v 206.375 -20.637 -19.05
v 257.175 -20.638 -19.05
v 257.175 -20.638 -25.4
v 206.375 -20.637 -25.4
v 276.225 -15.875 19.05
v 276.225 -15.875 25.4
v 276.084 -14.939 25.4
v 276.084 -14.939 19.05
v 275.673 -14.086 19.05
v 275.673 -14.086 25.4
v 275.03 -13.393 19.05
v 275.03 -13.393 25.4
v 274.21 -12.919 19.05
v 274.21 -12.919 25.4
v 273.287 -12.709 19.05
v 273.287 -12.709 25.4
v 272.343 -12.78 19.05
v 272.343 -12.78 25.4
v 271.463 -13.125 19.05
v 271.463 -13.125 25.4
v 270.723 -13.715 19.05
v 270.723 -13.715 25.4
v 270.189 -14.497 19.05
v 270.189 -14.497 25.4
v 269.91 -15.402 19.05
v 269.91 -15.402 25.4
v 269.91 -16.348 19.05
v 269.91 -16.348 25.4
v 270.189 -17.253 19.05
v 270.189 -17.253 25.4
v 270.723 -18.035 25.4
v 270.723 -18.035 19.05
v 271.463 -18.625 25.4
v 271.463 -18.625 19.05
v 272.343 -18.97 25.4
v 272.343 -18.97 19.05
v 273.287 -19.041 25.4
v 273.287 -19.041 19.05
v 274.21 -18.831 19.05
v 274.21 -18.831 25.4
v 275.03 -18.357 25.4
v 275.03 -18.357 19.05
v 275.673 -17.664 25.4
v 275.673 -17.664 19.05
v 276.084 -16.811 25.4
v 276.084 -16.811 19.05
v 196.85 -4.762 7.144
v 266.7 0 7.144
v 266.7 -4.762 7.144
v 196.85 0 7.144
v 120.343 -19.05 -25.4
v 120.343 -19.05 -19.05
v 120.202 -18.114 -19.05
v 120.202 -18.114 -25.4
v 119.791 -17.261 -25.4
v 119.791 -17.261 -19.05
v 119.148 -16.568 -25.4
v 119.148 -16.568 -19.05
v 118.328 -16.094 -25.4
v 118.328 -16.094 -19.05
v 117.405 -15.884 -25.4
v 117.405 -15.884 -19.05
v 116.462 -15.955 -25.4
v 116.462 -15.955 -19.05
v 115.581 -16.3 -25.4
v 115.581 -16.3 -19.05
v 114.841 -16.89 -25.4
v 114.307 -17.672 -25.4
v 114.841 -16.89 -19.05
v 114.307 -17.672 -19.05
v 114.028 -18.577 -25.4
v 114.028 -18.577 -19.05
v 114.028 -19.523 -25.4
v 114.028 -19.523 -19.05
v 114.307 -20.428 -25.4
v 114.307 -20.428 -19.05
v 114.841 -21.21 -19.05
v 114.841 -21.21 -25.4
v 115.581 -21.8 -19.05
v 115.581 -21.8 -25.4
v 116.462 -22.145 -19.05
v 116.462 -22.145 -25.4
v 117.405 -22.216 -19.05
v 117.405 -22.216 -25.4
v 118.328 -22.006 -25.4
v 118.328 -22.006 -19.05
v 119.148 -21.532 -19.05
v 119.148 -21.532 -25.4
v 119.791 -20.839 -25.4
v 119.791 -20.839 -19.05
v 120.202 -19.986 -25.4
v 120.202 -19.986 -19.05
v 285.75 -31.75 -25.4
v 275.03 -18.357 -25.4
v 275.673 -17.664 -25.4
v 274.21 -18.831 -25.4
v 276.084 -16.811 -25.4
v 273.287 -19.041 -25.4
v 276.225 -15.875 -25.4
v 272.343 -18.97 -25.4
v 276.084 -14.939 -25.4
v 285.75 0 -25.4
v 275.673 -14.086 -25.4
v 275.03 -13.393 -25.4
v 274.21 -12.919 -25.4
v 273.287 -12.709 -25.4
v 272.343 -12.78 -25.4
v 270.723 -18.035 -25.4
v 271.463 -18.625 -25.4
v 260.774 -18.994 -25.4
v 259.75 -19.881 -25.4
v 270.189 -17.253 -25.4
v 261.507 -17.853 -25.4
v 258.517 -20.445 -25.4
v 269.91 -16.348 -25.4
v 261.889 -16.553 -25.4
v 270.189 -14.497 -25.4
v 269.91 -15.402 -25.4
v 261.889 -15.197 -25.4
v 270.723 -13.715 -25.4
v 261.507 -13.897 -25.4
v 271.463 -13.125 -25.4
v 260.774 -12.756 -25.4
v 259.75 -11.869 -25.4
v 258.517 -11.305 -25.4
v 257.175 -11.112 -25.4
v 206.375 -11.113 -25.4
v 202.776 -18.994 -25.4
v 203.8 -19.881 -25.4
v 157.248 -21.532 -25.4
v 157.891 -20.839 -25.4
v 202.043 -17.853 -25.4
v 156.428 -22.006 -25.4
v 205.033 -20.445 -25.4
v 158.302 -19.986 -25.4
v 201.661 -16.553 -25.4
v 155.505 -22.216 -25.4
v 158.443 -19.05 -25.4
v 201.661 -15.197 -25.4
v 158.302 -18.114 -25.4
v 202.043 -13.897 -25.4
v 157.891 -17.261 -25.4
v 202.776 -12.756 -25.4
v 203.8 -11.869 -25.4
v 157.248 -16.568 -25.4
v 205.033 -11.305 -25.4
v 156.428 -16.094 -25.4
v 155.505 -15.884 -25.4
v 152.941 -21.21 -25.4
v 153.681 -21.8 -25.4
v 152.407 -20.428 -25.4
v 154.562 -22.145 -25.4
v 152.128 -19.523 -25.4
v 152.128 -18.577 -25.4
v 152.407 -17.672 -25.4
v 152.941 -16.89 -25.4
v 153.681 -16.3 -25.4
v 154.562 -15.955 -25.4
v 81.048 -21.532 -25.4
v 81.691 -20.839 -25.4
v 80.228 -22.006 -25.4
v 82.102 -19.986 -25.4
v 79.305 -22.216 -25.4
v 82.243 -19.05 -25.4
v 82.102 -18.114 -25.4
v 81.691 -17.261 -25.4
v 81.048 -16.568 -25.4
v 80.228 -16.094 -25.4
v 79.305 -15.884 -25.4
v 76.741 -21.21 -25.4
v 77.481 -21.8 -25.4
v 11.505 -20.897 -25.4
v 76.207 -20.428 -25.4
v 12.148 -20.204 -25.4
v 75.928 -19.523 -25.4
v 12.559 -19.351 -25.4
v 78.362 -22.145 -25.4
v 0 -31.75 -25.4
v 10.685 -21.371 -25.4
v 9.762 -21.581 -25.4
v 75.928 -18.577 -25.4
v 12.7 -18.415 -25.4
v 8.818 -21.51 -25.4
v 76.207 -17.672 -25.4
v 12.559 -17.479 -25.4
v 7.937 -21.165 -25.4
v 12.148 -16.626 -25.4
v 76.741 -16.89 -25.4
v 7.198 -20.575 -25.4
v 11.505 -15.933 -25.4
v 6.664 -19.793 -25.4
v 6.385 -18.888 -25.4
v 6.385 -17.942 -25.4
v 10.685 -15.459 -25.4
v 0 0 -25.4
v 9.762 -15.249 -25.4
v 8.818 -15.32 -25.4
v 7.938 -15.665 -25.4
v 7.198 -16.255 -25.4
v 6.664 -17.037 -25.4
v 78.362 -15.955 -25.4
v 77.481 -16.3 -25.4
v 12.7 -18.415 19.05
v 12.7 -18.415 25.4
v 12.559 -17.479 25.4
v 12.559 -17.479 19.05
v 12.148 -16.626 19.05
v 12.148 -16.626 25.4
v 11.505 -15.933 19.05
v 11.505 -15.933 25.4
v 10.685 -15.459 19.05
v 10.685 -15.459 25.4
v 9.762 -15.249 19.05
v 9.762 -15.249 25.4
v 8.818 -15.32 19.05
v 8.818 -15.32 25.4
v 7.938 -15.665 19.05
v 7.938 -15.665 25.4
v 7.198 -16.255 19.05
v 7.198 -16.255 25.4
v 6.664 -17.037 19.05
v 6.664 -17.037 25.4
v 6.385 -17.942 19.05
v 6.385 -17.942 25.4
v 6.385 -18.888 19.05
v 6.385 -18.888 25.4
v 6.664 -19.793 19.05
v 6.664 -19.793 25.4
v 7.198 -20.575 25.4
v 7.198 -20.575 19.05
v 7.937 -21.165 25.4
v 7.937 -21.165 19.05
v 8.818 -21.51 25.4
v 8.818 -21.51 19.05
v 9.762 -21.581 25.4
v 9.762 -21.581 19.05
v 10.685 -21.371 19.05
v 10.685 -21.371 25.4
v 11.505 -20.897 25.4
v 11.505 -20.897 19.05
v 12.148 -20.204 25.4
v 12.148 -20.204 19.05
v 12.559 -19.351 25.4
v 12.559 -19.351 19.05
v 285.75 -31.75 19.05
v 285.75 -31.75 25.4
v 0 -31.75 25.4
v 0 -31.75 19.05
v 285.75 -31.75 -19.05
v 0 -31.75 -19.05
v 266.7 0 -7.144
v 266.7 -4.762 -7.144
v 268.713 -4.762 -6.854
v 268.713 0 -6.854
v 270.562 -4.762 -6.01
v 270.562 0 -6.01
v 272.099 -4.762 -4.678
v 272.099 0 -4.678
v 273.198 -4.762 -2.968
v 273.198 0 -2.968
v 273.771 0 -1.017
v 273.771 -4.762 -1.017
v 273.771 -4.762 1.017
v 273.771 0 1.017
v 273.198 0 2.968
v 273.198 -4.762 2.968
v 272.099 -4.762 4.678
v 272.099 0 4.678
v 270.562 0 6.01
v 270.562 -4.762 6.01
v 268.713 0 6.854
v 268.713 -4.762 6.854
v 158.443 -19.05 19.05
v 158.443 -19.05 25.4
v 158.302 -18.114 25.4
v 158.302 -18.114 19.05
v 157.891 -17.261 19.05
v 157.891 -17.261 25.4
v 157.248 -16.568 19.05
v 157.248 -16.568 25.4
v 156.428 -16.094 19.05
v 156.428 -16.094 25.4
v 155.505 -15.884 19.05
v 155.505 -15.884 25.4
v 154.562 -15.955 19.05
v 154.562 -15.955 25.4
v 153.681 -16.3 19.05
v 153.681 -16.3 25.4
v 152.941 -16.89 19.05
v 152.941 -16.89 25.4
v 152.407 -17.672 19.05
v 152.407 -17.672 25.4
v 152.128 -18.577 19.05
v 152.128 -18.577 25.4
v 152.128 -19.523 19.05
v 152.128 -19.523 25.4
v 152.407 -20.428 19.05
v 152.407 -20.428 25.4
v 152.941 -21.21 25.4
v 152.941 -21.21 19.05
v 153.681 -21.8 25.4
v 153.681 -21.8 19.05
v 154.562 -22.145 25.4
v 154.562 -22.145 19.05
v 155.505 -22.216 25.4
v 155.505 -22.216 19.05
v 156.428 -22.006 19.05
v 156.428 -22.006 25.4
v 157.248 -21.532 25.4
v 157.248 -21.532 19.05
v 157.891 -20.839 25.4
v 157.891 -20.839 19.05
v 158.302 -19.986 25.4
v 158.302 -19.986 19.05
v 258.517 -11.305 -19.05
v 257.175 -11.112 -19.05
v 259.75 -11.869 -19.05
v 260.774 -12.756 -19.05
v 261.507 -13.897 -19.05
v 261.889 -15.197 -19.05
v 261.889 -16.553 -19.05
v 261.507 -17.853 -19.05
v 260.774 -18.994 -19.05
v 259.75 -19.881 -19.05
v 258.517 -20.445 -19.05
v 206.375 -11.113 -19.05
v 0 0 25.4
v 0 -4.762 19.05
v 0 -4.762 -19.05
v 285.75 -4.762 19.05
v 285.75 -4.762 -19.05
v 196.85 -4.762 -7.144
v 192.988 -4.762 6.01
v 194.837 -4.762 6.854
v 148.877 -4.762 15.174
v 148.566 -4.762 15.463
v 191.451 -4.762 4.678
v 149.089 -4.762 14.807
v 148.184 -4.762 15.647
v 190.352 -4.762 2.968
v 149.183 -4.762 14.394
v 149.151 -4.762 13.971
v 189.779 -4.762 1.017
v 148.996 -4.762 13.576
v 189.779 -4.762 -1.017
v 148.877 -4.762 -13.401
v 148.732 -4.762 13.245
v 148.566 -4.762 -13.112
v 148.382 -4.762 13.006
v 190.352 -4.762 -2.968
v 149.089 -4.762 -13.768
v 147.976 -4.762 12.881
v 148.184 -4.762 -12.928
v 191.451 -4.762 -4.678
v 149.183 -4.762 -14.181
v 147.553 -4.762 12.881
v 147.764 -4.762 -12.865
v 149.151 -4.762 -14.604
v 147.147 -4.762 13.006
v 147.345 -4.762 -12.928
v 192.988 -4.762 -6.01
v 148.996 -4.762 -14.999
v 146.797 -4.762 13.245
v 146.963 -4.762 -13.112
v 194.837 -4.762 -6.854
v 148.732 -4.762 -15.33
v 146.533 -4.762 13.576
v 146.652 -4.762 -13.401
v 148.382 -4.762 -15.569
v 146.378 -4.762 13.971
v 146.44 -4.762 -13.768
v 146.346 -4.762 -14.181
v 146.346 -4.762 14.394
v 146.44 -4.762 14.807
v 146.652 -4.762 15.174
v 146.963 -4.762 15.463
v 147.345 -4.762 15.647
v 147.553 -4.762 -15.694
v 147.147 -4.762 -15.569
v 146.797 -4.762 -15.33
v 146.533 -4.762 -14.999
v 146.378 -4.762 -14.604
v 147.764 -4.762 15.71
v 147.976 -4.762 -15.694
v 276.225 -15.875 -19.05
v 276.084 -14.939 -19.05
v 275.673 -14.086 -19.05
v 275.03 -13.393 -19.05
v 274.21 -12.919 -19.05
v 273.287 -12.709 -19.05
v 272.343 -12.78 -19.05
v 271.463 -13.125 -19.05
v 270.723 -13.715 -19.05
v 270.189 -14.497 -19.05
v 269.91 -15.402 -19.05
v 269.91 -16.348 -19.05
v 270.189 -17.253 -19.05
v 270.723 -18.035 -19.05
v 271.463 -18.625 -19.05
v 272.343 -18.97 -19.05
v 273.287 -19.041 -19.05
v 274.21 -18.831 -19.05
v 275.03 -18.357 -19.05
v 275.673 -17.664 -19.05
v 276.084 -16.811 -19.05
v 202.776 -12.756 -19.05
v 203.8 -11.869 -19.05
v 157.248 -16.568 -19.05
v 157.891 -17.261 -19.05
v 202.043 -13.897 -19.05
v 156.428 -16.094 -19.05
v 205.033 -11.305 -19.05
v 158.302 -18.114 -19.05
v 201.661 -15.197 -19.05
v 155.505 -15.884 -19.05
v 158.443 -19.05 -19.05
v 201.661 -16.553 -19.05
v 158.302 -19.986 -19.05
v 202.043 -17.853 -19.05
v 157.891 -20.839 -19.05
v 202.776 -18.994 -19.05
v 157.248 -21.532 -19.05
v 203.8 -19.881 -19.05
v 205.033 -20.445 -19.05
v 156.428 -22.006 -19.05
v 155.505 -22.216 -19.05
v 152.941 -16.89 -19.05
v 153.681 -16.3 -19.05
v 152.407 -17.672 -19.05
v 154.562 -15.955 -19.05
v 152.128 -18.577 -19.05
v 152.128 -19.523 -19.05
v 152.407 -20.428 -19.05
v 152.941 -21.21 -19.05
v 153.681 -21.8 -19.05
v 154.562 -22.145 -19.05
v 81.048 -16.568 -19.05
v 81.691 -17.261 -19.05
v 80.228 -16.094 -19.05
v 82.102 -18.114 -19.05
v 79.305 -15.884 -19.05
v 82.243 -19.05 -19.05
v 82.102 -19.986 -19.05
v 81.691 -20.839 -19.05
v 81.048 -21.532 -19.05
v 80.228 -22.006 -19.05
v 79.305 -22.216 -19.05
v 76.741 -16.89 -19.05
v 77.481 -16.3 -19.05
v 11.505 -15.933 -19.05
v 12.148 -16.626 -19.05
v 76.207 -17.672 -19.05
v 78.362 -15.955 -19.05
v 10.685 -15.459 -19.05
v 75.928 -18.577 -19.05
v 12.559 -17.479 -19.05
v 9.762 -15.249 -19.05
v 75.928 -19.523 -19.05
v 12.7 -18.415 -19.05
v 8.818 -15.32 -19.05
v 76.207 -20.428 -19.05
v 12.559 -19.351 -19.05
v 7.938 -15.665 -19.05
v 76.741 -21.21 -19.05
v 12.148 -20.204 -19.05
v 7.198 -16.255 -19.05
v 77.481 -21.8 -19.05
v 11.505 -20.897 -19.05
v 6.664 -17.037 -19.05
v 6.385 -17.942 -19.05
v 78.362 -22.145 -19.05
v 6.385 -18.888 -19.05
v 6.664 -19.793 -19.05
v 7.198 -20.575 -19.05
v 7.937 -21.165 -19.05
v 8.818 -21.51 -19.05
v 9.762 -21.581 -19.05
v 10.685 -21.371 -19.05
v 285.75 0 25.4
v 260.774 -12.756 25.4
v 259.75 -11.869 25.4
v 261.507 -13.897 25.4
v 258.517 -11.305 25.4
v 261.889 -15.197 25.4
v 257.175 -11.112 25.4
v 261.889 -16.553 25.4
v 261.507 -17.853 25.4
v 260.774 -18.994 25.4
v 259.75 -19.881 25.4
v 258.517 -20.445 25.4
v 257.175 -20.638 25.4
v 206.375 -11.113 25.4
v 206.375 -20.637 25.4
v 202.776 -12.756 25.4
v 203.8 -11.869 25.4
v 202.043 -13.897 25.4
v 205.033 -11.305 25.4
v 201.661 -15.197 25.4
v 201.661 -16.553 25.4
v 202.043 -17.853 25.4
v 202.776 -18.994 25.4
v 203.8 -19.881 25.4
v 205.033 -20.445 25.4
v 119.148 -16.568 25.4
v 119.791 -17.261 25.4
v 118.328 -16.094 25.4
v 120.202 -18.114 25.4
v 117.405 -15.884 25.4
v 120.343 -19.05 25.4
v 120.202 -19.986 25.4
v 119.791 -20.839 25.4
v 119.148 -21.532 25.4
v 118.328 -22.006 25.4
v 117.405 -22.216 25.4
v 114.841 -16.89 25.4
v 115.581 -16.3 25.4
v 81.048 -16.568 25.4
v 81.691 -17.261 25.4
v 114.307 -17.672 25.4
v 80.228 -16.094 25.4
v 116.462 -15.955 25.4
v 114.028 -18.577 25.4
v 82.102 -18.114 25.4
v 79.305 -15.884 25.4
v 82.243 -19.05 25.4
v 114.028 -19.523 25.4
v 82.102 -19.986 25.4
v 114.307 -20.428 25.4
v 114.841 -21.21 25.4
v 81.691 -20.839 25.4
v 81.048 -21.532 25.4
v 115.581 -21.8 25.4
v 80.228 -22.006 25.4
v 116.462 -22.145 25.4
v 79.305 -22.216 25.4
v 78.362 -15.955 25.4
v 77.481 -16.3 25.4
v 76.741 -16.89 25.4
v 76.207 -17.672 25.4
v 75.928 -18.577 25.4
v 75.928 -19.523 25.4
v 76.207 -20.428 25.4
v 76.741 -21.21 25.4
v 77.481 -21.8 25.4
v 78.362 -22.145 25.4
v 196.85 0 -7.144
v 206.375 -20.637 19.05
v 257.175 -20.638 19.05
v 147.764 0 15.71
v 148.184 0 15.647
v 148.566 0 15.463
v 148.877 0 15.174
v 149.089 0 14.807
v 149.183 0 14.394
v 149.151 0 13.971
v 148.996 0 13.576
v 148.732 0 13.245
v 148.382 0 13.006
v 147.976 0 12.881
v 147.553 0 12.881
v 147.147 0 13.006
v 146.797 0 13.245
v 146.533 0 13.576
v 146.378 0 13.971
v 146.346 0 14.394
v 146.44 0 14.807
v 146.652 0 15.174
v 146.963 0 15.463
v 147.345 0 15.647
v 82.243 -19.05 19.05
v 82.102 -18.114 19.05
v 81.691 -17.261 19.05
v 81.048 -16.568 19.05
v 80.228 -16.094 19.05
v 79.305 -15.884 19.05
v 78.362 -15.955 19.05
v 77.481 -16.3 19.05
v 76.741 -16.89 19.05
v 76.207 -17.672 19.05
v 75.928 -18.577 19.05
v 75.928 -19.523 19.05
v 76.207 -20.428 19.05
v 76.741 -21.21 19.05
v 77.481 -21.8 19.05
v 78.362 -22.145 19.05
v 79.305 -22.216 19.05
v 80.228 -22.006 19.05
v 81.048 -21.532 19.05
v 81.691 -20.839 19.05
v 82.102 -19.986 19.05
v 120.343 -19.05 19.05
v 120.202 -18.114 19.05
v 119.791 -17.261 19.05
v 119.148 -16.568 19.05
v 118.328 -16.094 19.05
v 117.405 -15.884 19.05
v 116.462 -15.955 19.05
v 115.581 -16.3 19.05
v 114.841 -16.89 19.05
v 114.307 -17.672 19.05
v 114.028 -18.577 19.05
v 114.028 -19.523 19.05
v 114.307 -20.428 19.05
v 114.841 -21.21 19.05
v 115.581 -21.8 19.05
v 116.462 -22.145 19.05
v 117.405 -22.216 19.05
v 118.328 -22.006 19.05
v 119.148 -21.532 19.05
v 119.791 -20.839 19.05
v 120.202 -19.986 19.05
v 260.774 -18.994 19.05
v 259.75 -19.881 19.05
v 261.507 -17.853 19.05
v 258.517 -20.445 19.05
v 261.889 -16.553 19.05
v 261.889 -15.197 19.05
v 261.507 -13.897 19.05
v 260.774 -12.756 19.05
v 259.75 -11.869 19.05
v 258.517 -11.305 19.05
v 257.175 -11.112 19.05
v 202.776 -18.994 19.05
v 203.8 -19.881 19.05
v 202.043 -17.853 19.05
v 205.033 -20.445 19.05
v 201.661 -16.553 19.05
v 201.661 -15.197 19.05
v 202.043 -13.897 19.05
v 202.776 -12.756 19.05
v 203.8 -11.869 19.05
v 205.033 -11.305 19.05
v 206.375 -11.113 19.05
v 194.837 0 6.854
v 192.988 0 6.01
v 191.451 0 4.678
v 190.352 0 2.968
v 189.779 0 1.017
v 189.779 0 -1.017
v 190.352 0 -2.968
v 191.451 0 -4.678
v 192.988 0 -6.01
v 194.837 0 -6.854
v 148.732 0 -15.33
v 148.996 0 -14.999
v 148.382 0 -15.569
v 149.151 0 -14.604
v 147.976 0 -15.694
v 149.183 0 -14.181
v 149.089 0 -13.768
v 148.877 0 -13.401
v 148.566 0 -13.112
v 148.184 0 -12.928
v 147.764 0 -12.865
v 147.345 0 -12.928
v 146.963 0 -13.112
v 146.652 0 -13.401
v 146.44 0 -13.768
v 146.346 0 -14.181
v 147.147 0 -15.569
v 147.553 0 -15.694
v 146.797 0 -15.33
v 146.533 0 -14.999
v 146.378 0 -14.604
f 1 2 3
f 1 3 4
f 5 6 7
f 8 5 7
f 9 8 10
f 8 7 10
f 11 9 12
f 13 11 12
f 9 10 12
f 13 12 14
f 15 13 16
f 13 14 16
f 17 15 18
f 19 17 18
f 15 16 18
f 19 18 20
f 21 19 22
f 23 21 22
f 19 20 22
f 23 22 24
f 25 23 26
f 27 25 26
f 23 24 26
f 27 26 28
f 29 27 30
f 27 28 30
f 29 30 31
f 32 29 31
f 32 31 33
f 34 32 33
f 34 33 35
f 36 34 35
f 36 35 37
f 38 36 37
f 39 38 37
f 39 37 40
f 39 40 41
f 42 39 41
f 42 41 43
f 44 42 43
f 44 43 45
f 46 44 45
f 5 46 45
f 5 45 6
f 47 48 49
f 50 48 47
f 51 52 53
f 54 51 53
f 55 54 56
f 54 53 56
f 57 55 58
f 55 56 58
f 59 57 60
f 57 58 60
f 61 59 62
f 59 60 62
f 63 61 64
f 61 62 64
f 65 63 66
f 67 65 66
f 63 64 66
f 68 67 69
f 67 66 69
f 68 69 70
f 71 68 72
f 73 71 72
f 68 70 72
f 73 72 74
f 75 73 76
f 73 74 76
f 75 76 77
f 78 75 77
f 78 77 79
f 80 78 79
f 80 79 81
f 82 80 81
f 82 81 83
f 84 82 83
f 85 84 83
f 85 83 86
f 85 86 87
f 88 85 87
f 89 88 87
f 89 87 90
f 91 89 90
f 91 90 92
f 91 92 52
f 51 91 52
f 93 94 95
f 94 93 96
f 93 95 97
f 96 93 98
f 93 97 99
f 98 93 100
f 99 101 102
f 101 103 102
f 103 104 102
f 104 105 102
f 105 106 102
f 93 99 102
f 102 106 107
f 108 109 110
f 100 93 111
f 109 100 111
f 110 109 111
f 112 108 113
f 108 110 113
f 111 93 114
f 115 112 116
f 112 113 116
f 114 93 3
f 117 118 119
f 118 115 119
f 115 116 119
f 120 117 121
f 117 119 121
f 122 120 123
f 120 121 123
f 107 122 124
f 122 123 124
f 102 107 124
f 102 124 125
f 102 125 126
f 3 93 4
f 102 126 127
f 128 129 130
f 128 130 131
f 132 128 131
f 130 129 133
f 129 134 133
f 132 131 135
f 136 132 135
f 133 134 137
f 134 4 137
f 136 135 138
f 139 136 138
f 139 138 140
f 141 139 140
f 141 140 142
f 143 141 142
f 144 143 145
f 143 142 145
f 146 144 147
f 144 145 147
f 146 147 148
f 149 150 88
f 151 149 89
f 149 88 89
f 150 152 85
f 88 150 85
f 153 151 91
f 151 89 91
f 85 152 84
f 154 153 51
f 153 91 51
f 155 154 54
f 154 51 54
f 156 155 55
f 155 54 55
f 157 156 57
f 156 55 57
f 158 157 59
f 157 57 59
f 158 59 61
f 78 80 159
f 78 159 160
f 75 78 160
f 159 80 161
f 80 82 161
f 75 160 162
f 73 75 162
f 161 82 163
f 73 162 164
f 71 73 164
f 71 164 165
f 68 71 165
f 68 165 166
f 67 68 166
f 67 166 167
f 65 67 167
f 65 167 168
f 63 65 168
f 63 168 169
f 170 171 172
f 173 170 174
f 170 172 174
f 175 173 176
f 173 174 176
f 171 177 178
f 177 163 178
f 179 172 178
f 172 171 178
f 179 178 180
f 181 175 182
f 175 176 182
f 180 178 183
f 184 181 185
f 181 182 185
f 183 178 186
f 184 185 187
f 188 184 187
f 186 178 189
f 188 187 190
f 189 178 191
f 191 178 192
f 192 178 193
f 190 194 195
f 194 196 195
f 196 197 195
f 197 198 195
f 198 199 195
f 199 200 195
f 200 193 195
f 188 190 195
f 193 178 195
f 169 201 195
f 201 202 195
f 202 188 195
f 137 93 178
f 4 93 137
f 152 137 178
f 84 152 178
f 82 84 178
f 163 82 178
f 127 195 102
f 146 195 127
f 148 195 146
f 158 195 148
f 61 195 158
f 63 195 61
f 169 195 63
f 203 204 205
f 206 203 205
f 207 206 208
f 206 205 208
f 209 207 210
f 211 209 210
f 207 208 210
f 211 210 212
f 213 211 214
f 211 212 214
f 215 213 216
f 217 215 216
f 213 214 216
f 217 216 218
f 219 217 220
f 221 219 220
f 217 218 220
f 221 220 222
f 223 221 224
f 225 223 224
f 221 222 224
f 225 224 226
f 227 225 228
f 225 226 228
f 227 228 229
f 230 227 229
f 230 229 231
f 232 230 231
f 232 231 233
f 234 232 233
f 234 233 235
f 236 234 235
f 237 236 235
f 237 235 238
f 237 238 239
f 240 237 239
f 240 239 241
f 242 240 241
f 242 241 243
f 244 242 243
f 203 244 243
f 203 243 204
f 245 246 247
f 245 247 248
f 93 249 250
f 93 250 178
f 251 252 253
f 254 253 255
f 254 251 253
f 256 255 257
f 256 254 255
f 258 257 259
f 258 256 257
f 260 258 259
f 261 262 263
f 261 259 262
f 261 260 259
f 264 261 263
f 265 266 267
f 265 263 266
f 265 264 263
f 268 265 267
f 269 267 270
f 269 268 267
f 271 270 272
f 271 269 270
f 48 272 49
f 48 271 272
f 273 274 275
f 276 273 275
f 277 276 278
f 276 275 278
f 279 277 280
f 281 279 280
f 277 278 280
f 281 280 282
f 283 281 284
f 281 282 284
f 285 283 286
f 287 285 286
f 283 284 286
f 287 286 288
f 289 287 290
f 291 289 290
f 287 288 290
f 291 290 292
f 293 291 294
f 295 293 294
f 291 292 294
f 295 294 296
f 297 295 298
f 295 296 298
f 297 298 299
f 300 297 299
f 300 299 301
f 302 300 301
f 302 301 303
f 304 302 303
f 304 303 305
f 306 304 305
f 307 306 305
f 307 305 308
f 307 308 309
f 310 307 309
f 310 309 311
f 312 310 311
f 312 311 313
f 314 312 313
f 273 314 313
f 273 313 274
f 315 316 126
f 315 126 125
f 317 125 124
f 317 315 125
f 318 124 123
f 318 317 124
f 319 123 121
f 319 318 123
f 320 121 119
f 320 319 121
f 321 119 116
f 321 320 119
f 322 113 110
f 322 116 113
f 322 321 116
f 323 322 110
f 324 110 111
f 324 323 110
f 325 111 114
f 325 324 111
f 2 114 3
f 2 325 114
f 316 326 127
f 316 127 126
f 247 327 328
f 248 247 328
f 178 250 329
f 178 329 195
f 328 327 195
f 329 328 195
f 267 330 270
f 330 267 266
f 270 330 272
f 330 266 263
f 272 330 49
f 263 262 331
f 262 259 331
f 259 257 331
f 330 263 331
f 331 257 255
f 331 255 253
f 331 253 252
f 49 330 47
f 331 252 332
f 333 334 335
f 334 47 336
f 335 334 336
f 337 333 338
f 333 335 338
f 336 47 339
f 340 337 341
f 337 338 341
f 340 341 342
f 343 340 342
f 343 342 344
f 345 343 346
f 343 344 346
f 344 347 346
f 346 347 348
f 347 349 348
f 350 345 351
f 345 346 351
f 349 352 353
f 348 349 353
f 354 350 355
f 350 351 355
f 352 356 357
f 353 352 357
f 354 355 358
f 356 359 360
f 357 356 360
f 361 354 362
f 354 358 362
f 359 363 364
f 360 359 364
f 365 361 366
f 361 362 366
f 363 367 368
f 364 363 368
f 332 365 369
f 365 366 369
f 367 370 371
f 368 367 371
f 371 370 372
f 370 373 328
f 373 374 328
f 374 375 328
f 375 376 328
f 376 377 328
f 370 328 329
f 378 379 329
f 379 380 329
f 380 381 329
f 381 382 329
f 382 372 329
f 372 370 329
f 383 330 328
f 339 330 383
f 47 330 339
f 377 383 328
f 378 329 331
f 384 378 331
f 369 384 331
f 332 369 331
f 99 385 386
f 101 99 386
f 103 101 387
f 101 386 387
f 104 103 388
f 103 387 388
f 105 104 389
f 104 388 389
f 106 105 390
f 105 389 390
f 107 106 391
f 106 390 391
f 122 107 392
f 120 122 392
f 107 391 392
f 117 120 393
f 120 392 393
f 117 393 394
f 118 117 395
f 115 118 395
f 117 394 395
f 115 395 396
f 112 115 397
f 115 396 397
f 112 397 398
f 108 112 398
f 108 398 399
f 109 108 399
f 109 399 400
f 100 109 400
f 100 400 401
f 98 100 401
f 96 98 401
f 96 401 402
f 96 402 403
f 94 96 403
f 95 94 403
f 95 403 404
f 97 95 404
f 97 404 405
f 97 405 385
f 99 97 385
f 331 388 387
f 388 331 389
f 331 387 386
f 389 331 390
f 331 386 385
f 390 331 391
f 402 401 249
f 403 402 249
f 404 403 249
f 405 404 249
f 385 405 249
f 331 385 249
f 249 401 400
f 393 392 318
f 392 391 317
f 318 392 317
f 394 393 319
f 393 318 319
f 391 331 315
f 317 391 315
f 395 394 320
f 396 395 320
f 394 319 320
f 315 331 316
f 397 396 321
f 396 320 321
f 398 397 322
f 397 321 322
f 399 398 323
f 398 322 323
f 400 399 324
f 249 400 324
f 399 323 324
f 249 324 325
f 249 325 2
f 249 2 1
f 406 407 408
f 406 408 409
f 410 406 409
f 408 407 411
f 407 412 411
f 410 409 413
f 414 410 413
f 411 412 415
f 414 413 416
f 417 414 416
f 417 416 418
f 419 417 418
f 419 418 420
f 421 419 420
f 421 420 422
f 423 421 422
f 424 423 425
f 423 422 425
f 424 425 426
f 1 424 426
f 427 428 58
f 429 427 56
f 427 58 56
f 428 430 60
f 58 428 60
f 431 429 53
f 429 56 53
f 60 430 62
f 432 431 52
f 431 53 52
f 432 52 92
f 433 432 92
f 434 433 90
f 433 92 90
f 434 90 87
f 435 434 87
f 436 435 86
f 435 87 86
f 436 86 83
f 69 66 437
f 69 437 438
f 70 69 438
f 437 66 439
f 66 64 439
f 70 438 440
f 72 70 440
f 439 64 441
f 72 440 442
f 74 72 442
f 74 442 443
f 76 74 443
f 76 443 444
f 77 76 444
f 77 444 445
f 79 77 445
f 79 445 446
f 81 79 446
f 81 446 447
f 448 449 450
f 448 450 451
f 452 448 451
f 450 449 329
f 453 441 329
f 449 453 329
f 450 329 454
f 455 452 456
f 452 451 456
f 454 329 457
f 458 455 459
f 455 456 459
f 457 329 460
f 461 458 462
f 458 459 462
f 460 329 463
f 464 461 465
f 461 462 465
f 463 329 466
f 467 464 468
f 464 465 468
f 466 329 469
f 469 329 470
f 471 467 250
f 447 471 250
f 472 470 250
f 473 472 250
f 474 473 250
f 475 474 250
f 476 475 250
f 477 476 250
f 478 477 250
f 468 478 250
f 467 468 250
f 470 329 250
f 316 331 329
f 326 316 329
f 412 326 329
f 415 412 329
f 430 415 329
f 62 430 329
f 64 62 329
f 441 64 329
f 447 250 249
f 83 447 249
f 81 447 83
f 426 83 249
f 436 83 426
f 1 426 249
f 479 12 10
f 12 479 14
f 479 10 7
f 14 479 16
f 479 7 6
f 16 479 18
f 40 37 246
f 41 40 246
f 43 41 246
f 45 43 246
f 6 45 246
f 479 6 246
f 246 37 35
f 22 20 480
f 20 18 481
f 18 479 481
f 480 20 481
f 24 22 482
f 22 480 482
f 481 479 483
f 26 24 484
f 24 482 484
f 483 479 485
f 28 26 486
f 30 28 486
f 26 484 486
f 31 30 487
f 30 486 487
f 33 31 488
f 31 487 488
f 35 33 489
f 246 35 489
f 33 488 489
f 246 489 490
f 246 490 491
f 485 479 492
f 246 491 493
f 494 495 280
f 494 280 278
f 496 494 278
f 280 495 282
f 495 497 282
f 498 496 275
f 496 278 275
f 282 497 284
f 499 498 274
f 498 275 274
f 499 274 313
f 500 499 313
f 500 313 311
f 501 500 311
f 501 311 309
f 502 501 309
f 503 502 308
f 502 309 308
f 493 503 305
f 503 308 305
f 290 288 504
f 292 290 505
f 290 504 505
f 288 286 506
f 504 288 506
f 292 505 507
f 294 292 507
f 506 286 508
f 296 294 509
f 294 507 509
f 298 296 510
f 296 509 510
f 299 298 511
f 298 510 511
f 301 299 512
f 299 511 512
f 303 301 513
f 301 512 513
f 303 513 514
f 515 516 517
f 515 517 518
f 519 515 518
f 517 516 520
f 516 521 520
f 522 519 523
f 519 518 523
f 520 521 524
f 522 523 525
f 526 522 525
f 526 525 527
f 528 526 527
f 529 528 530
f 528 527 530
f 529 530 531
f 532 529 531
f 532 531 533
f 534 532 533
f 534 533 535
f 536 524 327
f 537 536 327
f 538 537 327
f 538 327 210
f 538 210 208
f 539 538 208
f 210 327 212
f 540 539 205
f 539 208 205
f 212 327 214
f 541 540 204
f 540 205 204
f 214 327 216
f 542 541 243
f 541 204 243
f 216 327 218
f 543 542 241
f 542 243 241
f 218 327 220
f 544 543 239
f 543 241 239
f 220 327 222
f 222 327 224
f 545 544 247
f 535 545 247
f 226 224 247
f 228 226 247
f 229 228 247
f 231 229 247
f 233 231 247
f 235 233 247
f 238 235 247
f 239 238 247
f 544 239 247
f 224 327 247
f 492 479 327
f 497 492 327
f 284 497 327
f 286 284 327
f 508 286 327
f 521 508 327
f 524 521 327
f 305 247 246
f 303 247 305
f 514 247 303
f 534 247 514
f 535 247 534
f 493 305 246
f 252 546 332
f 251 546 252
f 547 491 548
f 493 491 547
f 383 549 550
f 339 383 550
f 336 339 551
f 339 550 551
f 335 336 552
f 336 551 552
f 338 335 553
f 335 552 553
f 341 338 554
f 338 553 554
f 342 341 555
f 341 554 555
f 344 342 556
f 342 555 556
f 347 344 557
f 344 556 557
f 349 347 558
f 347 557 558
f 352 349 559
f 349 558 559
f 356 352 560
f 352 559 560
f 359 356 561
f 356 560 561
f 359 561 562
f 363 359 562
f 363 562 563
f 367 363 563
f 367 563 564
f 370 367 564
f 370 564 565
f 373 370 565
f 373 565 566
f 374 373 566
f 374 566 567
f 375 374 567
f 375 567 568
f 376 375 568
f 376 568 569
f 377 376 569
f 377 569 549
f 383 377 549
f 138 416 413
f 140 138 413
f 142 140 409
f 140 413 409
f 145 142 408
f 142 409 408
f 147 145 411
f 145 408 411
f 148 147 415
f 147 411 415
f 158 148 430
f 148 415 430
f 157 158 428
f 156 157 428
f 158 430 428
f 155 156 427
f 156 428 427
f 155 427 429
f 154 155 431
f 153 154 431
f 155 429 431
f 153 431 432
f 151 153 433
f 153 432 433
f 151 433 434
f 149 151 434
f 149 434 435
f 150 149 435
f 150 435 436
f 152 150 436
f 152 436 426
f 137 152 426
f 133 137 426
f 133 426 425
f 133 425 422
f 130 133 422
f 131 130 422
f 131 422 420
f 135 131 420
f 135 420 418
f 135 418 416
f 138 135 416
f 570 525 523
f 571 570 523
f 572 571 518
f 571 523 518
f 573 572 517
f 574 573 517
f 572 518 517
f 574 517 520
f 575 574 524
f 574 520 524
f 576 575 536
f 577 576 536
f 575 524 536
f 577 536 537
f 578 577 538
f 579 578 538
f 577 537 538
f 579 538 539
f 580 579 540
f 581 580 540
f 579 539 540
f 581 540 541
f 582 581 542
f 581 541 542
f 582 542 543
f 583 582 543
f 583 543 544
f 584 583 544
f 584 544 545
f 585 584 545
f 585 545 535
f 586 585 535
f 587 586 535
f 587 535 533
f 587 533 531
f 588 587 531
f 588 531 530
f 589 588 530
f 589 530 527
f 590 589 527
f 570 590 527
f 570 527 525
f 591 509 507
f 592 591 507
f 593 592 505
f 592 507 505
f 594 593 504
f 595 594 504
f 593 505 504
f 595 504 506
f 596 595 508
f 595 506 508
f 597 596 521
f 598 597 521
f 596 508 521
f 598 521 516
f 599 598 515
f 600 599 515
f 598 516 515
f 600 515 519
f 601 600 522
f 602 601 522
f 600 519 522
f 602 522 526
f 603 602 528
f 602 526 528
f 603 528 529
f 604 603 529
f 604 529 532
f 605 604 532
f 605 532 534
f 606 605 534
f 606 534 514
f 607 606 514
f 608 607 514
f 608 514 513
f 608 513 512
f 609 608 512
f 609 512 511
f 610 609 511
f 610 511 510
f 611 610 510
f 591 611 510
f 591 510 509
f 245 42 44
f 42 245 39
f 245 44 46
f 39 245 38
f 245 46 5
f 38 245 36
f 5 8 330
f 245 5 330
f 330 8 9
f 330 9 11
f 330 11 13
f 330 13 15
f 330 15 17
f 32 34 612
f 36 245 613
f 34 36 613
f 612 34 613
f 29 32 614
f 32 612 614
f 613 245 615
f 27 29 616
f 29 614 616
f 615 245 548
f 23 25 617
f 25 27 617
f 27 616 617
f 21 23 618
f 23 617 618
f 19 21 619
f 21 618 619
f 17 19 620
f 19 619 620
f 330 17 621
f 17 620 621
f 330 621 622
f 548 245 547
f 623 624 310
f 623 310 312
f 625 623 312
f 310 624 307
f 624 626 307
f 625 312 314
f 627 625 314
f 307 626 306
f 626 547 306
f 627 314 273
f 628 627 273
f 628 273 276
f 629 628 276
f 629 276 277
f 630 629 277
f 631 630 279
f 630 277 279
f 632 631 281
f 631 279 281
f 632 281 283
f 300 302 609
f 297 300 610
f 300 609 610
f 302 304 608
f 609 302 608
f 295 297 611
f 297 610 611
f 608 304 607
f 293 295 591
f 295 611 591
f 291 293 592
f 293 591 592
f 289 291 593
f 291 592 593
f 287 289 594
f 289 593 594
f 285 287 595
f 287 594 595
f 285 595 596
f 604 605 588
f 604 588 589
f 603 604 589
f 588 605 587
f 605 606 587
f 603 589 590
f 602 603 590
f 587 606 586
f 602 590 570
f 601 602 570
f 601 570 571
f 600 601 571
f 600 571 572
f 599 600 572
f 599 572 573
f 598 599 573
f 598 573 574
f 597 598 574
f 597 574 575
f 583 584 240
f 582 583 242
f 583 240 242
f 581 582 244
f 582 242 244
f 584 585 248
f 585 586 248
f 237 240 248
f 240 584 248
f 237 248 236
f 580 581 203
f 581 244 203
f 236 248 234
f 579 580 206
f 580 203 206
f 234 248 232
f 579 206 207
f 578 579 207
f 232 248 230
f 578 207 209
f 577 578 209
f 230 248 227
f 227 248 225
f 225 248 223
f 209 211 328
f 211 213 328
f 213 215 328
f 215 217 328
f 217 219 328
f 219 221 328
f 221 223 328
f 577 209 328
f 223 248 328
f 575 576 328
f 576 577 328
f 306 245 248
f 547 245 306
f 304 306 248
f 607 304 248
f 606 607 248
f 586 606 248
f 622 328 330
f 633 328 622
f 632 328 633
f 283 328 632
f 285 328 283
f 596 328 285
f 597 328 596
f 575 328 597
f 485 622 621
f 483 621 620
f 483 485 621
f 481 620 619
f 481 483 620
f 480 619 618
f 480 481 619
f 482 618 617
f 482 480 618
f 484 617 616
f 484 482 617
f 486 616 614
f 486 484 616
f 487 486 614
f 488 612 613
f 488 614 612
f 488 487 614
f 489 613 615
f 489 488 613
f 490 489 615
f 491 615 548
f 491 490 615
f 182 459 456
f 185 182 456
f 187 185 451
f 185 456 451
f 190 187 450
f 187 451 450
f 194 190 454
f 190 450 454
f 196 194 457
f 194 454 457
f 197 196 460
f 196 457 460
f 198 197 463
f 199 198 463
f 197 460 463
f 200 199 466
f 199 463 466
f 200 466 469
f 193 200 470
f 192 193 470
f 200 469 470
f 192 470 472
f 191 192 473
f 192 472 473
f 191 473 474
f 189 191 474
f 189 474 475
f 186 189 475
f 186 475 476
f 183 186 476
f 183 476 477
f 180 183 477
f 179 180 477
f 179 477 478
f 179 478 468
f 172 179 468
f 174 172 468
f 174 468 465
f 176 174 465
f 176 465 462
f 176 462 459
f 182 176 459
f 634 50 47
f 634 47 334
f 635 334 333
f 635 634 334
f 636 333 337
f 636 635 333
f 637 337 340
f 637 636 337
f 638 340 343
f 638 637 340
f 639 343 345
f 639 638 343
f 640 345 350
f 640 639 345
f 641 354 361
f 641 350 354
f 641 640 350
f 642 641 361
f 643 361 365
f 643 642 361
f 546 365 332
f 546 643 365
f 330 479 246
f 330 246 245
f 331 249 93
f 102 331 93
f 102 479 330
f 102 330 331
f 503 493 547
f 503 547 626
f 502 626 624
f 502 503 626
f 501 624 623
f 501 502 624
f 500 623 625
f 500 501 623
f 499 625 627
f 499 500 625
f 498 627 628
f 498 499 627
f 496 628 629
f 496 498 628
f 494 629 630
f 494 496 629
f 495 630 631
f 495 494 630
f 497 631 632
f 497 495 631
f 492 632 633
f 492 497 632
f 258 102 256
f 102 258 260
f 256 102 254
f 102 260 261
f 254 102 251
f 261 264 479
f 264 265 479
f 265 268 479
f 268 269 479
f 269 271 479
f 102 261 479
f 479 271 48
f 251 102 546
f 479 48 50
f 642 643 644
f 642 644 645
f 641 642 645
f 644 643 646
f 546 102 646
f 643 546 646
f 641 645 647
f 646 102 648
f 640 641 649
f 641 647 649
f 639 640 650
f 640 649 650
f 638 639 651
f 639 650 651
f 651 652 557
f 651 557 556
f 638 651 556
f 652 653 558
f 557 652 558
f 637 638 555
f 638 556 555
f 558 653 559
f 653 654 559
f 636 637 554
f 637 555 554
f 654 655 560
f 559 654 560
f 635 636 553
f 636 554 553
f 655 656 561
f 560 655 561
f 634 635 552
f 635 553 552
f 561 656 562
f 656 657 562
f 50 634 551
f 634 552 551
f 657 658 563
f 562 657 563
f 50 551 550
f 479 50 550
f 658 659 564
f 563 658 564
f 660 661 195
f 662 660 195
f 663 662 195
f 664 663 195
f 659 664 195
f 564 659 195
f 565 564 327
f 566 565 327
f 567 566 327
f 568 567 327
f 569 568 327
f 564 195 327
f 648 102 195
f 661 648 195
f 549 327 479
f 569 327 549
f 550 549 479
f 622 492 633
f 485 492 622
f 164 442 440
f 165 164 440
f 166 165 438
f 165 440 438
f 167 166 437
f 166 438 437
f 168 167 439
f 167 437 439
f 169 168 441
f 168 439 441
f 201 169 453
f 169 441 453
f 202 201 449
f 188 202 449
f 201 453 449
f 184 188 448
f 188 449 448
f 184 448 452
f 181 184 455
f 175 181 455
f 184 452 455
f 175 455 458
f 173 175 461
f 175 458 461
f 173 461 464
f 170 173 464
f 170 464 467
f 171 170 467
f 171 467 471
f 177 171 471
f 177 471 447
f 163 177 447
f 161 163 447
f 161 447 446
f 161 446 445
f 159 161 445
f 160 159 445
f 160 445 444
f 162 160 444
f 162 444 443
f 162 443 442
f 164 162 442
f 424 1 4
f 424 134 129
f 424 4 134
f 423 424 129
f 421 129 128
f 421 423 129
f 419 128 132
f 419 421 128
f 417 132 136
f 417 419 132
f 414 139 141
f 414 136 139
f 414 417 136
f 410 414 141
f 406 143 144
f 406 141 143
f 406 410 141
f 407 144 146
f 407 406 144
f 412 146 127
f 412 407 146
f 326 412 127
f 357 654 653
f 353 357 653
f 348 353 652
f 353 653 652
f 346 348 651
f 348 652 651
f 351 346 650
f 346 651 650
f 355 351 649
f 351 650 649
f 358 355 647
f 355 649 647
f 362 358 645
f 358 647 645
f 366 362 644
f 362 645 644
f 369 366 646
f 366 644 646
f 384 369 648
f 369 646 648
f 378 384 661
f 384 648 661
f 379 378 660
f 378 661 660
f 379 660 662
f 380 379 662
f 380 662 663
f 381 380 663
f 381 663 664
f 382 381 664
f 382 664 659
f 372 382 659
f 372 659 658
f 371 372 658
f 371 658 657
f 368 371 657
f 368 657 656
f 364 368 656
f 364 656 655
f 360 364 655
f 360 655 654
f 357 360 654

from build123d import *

# Parameters (mm, degrees)
BOSS_EXTRUDE1_DEPTH = 285.75
SKETCH2_R           = 3.175
CUT_EXTRUDE1_DEPTH  = 292.961923887
SKETCH3_R           = 1.4224
CUT_EXTRUDE2_DEPTH  = 6.35
SKETCH4_R           = 3.175
CUT_EXTRUDE3_DEPTH  = 292.961923887


with BuildPart() as part:
    # Sketch1 → Boss-Extrude1 (new body)
    with BuildSketch(Plane(origin=(0, 0, 0), x_dir=(0, 0, -1), z_dir=(1, 0, 0))):
        Polygon((-19.05, -31.75), (-19.05, -4.7625), (19.05, -4.7625), (19.05, -31.75), (25.4, -31.75), (25.4, 0), (-25.4, 0), (-25.4, -31.75), align=None)
    extrude(amount=BOSS_EXTRUDE1_DEPTH)

    # Sketch2 → Cut-Extrude1 (cut, through all)
    with BuildSketch(Plane.XY.offset(25.4)):
        with Locations((9.525, -18.415)):
            Circle(SKETCH2_R)
        with Locations((79.068028046, -19.05)):
            Circle(SKETCH2_R)
        with Locations((117.168028046, -19.05)):
            Circle(SKETCH2_R)
        with Locations((155.268028046, -19.05)):
            Circle(SKETCH2_R)
        with BuildLine():
            Line((206.375, -11.1125), (257.175, -11.1125))
            ThreePointArc((257.175, -11.1125), (261.9375, -15.875), (257.175, -20.6375))
            Line((257.175, -20.6375), (206.375, -20.6375))
            ThreePointArc((206.375, -20.6375), (201.6125, -15.875), (206.375, -11.1125))
        make_face()
    extrude(amount=-CUT_EXTRUDE1_DEPTH, mode=Mode.SUBTRACT)

    # Sketch3 → Cut-Extrude2 (cut)
    with BuildSketch(Plane(origin=(0, 0, 0), x_dir=(1, 0, 0), z_dir=(0, 1, 0))):
        with Locations(Location((147.7645, 14.2875, 0), (0, 0, 270))):
            Circle(SKETCH3_R)
        with Locations(Location((147.7645, -14.2875, 0), (0, 0, 270))):
            Circle(SKETCH3_R)
        with BuildLine():
            Line((196.85, 7.14375), (266.7, 7.14375))
            ThreePointArc((266.7, 7.14375), (273.84375, 0), (266.7, -7.14375))
            Line((266.7, -7.14375), (196.85, -7.14375))
            ThreePointArc((196.85, -7.14375), (189.70625, 0), (196.85, 7.14375))
        make_face()
    extrude(amount=-CUT_EXTRUDE2_DEPTH, mode=Mode.SUBTRACT)

    # Sketch4 → Cut-Extrude3 (cut, through all)
    with BuildSketch(Plane.XY.offset(25.4)):
        with Locations((273.05, -15.875)):
            Circle(SKETCH4_R)
    extrude(amount=-CUT_EXTRUDE3_DEPTH, mode=Mode.SUBTRACT)


solid = part.part
